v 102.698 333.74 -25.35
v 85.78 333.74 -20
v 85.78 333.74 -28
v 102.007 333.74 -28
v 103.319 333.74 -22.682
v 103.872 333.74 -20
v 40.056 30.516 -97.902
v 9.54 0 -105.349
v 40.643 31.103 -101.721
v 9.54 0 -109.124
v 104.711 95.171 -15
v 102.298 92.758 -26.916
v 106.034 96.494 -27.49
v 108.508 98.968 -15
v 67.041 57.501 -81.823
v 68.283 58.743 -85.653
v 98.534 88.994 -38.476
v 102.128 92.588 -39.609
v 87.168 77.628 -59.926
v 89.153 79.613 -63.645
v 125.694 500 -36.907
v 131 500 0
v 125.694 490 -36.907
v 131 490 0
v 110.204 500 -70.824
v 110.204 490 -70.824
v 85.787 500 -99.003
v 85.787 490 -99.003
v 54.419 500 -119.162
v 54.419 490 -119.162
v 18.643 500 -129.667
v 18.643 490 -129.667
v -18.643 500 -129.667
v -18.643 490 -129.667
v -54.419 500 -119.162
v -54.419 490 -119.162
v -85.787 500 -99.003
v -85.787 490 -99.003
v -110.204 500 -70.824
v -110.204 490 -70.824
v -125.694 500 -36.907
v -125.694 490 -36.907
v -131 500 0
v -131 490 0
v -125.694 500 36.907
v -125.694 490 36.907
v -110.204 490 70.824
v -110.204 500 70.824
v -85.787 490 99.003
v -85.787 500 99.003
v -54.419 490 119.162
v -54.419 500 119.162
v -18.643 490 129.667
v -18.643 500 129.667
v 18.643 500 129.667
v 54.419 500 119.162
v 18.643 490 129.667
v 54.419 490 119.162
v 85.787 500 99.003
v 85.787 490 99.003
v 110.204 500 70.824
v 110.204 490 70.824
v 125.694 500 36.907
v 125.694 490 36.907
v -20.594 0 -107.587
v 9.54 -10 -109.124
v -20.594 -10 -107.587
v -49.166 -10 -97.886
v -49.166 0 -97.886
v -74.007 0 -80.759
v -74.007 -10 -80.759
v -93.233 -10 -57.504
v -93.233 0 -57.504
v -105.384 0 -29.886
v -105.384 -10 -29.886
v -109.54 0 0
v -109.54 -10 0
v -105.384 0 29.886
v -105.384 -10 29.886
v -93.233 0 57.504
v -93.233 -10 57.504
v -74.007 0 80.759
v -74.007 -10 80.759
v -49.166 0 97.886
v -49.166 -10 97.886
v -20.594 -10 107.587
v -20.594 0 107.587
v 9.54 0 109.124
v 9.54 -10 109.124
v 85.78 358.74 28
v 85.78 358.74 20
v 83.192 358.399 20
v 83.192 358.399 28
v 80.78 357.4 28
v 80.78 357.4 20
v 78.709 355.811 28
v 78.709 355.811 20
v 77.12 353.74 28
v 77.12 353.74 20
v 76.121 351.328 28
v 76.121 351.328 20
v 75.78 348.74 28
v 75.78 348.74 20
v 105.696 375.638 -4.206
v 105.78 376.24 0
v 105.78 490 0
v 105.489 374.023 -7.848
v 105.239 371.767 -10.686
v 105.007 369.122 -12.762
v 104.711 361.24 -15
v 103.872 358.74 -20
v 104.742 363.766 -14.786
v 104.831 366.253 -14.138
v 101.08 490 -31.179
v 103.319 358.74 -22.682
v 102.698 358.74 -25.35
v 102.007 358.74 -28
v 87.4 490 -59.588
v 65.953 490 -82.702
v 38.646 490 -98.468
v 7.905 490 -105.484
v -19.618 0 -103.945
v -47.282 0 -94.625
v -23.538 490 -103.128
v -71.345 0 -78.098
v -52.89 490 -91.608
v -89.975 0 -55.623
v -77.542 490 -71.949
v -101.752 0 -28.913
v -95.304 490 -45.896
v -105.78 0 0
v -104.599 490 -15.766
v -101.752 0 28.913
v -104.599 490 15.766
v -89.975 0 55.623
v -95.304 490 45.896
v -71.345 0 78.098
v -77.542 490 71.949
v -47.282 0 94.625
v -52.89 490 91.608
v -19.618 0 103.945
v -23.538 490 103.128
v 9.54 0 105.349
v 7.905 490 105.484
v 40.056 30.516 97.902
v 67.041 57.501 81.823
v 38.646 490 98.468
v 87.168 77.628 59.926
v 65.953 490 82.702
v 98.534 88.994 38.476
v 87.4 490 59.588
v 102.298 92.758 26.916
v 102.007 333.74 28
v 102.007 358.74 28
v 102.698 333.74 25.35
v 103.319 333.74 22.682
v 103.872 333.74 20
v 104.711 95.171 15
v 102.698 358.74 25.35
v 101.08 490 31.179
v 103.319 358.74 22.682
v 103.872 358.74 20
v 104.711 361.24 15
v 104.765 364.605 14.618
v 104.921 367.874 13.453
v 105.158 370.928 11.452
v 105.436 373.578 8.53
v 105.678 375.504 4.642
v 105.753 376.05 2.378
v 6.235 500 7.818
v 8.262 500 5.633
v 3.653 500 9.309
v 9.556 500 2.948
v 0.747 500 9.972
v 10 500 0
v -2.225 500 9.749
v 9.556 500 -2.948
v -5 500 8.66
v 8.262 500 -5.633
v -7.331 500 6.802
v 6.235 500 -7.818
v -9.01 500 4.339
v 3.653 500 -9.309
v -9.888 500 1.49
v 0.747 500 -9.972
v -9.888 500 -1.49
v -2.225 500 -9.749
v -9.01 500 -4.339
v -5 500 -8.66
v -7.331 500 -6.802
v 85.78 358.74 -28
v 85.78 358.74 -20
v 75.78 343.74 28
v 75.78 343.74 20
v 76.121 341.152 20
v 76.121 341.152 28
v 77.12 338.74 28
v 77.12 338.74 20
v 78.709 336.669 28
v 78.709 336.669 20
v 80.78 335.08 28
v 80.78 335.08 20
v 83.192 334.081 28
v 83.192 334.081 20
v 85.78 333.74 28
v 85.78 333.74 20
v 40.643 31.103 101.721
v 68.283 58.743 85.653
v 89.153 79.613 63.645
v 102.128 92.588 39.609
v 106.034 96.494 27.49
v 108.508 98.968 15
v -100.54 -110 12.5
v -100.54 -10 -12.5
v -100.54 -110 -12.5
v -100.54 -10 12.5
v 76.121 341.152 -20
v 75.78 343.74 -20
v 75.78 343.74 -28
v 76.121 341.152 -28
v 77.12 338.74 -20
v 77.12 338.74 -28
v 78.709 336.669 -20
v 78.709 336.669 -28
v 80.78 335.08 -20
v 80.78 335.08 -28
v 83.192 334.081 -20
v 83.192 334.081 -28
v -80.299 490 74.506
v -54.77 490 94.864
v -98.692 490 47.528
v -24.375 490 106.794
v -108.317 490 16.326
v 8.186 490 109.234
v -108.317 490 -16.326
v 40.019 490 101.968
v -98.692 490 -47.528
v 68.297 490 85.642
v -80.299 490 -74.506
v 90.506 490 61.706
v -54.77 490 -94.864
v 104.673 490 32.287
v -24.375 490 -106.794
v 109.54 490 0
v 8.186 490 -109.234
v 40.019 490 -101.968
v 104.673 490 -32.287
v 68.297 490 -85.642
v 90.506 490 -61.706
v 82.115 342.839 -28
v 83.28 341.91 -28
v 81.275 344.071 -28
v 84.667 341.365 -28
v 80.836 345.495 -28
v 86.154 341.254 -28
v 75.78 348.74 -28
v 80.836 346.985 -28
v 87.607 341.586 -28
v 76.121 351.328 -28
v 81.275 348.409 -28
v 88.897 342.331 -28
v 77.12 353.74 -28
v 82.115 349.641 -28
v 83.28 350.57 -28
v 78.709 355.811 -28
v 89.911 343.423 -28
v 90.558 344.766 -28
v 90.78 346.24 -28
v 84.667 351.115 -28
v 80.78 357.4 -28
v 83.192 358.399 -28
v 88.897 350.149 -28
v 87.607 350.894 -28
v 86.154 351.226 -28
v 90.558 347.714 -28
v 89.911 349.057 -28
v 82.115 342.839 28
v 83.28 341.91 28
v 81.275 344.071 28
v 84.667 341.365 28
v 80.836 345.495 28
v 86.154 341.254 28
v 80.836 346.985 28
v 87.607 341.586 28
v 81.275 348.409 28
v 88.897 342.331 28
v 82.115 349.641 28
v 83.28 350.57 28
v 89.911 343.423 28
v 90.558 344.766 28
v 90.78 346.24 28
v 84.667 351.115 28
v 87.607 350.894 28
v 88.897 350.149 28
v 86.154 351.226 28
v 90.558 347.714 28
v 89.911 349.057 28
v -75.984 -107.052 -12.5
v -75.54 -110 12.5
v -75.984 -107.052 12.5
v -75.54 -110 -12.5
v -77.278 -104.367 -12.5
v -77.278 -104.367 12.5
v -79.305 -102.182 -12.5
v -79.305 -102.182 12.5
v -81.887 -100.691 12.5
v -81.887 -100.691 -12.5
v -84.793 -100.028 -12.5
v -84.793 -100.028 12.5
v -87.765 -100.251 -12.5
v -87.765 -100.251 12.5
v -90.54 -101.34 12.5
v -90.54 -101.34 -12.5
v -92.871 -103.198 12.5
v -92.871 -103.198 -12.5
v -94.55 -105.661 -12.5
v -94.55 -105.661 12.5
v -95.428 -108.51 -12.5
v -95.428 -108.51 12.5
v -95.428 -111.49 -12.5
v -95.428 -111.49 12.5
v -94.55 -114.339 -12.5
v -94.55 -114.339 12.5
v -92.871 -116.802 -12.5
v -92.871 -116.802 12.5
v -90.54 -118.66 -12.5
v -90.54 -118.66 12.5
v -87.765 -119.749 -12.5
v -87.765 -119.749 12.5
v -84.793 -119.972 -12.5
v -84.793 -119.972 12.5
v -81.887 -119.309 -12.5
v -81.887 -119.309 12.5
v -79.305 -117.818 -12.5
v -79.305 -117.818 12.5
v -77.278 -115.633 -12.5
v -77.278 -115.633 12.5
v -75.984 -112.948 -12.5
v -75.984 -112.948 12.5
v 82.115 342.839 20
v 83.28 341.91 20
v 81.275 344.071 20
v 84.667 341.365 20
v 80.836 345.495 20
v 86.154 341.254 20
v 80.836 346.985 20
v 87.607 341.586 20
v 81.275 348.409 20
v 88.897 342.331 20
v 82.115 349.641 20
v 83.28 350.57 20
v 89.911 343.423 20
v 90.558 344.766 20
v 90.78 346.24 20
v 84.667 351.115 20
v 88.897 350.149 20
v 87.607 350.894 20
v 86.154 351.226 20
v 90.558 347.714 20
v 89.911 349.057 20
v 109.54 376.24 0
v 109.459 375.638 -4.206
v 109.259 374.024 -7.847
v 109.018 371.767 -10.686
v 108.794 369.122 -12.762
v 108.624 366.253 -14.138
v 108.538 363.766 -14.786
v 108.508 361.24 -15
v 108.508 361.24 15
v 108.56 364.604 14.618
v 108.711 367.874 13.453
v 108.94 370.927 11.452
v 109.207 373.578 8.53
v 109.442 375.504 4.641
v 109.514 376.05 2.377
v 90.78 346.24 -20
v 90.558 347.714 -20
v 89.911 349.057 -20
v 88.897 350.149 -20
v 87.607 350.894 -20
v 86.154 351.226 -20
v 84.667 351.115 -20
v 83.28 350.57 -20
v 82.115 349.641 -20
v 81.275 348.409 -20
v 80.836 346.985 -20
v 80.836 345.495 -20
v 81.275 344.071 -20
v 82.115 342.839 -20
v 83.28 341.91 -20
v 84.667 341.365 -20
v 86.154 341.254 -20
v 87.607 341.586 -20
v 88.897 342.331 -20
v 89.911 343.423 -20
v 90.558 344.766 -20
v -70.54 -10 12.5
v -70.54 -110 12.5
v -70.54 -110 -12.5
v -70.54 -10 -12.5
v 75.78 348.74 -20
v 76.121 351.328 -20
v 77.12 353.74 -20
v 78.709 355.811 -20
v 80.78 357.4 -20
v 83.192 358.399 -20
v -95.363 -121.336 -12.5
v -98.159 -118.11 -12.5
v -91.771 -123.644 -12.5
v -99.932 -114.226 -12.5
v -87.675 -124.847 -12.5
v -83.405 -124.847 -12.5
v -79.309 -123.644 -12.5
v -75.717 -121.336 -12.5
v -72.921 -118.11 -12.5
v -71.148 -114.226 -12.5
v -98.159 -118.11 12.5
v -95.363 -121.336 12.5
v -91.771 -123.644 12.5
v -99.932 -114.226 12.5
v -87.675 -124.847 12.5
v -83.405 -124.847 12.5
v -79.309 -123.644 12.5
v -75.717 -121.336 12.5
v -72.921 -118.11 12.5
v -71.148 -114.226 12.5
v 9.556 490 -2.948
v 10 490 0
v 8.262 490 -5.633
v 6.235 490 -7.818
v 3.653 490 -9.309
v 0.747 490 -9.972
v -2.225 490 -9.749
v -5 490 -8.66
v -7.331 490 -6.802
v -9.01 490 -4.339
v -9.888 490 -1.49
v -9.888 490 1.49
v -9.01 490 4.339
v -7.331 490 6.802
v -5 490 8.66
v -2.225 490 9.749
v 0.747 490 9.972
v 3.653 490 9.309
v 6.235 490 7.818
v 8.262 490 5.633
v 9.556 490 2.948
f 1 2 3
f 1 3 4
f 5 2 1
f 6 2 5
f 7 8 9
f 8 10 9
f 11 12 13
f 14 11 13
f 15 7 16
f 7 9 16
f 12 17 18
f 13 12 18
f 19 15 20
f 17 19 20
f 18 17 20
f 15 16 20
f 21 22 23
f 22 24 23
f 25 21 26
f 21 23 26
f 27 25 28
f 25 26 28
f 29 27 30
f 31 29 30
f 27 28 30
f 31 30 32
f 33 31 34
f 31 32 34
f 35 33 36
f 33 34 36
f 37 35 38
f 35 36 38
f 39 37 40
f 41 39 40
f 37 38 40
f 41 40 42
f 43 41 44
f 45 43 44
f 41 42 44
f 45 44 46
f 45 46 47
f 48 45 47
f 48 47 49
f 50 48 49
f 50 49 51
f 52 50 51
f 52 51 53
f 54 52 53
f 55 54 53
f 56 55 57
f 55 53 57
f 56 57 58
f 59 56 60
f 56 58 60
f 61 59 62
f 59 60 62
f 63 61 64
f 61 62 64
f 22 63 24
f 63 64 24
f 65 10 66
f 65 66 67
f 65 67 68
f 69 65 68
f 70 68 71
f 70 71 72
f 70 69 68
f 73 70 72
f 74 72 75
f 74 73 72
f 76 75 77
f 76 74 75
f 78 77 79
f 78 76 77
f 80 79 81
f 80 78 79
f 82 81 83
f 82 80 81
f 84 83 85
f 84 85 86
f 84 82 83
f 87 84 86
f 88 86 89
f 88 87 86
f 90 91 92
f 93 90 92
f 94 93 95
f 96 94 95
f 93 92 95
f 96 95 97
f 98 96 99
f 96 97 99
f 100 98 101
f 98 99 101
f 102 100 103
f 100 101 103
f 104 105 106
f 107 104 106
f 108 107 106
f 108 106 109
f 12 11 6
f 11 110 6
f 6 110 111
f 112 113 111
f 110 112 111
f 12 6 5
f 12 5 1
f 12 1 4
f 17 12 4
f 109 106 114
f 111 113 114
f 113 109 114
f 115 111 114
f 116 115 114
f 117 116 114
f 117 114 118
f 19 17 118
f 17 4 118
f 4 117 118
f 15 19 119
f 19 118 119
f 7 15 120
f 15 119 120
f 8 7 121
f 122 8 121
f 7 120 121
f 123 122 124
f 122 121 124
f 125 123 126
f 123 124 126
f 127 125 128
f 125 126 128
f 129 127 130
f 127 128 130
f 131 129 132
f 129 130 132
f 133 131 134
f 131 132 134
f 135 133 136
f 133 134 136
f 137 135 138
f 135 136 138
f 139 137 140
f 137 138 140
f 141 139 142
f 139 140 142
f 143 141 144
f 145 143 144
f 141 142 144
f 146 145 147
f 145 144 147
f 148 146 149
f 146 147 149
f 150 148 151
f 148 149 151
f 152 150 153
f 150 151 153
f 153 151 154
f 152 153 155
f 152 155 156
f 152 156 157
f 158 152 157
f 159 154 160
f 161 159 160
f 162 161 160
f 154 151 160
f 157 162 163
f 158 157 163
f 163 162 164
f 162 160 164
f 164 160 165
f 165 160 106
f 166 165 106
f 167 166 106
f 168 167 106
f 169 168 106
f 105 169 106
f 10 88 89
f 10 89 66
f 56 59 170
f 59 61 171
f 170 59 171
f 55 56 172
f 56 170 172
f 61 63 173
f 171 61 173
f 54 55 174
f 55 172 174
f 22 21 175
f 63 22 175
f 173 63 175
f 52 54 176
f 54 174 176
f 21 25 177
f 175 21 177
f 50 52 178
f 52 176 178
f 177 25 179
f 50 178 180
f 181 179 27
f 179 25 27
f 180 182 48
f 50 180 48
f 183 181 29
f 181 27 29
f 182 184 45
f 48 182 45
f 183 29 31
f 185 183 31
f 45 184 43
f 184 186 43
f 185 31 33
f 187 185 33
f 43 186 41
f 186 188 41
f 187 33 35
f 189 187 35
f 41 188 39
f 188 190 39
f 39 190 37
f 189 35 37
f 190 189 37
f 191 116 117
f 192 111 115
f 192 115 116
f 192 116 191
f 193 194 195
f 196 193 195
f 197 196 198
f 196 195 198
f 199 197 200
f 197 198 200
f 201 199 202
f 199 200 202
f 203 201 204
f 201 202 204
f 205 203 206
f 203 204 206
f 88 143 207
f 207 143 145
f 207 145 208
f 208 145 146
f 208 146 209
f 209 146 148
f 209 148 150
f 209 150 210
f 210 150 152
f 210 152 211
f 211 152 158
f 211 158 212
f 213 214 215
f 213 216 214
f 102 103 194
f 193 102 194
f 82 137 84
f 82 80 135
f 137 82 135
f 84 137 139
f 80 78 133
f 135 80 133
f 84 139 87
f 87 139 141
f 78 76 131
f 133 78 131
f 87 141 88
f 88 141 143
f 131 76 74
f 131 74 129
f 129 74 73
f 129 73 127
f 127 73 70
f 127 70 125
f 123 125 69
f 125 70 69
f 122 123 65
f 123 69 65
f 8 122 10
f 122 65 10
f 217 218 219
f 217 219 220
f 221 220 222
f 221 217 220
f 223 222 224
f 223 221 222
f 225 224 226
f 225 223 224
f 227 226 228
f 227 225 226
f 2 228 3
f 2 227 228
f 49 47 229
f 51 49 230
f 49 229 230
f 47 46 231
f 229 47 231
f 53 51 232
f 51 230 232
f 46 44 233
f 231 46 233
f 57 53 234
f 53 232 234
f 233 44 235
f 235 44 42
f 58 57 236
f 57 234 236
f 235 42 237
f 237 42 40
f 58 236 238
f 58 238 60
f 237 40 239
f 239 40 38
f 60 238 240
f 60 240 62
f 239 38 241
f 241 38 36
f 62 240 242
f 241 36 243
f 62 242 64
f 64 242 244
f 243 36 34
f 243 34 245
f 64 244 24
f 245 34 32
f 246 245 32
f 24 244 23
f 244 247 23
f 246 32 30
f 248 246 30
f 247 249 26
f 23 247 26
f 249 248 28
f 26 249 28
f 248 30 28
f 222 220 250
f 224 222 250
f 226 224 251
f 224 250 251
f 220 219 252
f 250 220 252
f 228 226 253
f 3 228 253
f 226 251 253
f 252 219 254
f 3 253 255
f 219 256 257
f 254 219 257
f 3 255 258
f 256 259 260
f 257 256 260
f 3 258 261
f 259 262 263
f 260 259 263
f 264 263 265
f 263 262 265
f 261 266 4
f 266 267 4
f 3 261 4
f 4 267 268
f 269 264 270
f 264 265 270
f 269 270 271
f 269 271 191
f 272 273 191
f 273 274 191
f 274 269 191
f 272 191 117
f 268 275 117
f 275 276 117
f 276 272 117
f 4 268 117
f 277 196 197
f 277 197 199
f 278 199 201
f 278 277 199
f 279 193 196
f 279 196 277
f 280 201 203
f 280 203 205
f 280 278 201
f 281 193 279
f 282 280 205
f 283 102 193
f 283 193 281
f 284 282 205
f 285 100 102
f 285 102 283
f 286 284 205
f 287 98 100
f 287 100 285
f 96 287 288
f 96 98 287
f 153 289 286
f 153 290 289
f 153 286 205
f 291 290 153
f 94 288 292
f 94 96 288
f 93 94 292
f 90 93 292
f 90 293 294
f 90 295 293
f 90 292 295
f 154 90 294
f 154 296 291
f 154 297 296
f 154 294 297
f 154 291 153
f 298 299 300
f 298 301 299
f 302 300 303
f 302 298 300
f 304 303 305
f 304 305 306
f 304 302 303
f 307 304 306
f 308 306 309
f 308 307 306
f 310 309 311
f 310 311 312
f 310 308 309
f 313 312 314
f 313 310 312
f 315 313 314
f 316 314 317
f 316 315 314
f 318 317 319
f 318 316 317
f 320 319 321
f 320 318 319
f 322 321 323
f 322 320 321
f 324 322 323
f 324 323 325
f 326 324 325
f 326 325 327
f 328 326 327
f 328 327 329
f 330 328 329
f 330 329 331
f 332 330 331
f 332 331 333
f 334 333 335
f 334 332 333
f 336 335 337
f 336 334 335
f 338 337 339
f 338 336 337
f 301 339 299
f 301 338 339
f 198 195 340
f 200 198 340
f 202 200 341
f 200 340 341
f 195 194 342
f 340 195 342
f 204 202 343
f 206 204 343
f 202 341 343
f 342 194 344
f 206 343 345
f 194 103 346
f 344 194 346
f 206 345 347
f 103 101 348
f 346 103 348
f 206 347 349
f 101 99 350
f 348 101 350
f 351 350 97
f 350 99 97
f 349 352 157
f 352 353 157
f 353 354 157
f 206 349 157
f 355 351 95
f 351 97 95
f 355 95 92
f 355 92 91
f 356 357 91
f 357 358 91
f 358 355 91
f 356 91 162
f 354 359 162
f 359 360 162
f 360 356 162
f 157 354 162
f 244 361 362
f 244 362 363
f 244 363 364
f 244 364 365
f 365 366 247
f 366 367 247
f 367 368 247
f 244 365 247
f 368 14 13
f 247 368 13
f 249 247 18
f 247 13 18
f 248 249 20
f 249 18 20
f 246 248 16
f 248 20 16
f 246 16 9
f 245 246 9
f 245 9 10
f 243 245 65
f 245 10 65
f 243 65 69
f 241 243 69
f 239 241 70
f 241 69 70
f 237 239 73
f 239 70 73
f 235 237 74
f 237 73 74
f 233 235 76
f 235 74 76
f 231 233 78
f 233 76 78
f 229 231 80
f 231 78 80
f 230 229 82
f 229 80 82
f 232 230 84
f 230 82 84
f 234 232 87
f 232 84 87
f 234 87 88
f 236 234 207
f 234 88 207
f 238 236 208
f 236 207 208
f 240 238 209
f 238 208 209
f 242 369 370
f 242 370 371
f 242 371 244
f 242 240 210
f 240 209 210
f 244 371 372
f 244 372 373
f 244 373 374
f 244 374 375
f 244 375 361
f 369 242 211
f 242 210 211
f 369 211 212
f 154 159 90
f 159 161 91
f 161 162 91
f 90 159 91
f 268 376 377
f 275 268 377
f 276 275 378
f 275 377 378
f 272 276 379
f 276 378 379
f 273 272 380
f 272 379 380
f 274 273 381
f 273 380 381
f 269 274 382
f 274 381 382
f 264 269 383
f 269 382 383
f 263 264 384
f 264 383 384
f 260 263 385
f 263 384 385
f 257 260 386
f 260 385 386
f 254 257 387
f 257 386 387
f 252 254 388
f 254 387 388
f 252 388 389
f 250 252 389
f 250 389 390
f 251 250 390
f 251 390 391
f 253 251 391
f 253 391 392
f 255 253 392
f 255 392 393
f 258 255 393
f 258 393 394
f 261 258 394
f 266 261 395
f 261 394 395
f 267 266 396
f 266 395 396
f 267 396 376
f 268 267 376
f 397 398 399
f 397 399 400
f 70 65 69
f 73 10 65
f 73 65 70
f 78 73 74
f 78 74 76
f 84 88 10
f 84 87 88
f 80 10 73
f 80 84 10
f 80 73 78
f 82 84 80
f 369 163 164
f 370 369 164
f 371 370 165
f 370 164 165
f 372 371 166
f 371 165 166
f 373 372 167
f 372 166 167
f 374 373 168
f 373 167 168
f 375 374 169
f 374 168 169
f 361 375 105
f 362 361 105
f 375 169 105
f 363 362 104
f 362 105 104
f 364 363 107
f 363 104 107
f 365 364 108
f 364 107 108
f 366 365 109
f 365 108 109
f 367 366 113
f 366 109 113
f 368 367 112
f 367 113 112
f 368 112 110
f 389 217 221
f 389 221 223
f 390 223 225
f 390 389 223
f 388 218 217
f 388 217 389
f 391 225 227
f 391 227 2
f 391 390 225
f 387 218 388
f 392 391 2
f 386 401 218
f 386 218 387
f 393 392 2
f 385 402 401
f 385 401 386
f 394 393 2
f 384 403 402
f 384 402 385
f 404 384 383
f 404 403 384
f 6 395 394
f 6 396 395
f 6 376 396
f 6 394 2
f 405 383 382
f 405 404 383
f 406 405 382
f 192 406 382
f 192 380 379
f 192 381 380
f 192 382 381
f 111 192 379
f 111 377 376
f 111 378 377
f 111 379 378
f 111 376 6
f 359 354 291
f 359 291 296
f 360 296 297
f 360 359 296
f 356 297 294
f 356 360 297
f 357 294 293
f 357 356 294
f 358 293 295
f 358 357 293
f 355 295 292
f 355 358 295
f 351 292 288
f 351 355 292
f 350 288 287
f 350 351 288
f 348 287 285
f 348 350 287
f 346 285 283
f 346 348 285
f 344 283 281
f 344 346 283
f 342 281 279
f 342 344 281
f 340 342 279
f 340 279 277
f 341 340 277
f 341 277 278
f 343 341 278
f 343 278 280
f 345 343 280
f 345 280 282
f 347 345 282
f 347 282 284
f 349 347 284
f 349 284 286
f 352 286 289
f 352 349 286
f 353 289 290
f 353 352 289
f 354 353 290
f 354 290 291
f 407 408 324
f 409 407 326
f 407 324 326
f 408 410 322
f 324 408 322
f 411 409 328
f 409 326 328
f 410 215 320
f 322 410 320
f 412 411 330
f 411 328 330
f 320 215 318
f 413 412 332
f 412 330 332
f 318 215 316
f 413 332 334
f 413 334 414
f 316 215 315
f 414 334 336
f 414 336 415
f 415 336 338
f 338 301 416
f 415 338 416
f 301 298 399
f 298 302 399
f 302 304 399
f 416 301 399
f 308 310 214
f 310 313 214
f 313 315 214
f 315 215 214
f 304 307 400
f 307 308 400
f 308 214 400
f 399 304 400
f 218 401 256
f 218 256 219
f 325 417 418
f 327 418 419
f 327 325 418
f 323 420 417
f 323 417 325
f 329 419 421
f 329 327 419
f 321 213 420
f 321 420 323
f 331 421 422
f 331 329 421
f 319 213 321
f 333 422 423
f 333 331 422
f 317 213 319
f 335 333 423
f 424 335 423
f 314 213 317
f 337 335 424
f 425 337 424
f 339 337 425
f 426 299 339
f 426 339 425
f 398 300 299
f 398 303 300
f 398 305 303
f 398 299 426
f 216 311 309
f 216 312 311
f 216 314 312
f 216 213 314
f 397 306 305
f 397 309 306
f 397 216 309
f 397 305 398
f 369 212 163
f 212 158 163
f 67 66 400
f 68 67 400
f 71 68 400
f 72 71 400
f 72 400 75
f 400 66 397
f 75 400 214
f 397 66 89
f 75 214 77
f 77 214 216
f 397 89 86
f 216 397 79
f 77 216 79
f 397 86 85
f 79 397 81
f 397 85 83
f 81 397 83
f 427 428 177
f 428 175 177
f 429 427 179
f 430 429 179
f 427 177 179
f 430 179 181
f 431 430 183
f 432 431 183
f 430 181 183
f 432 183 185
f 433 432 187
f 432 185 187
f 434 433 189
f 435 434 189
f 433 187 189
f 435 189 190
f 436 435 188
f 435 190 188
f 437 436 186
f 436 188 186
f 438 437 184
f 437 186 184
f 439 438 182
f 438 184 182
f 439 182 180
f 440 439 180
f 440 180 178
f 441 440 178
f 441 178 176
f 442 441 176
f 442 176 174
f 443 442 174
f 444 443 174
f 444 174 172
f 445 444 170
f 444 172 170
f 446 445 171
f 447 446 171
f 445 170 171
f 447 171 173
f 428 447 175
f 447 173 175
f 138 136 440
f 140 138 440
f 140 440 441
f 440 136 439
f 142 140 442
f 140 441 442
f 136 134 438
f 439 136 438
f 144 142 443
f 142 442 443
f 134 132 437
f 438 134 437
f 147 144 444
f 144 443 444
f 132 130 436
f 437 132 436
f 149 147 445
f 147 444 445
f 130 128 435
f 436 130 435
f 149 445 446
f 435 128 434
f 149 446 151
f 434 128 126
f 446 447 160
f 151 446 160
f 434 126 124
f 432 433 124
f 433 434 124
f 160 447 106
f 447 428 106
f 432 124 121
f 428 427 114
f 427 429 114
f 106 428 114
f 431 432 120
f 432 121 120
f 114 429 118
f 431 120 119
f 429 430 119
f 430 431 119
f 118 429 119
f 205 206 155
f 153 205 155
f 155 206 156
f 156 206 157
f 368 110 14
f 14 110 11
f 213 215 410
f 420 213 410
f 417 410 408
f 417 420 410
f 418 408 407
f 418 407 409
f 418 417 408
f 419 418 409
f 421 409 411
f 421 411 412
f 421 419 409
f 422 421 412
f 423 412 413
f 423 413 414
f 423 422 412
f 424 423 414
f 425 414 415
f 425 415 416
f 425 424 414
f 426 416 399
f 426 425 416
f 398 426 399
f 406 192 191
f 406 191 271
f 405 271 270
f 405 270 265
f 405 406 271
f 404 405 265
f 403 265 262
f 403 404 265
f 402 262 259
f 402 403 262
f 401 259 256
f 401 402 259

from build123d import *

# Parameters (mm, degrees)
CORTE_EXTRUS_O1_DEPTH      = 132
CORTE_EXTRUS_O1_DEPTH_BACK = 132
RESSALTO_EXTRUS_O1_DEPTH   = 10
ESBO_O4_R                  = 10
RESSALTO_EXTRUS_O2_DEPTH   = 12.5
RESSALTO_EXTRUS_O3_START   = 20
ESBO_O5_R                  = 5
RESSALTO_EXTRUS_O3_DEPTH   = 8
CORTE_EXTRUS_O2_DEPTH      = 132


with BuildPart() as part:
    # Esboço1 → Revolução1 (revolve)
    with BuildSketch(Plane.XY):
        Polygon((10, 500), (131, 500), (131, 490), (109.54, 490), (109.54, 0), (105.78, 0), (105.78, 490), (10, 490), align=None)
    revolve(axis=Axis((0, 0, 0), (0, 1, 0)))

    # Esboço2 → Corte-extrusão1 (cut, two sides)
    with BuildSketch(Plane.XY) as corte_extrus_o1_sk:
        Polygon((9.54, 0), (109.54, 100), (109.54, 0), align=None)
    extrude(amount=CORTE_EXTRUS_O1_DEPTH, mode=Mode.SUBTRACT)
    extrude(corte_extrus_o1_sk.sketch, amount=-CORTE_EXTRUS_O1_DEPTH_BACK, mode=Mode.SUBTRACT)

    # Esboço5 → Ressalto-extrusão3 (add)
    with BuildSketch(Plane.XY.offset(RESSALTO_EXTRUS_O3_START)):
        with BuildLine():
            Line((105.78, 358.74), (85.78, 358.74))
            ThreePointArc((85.78, 358.74), (78.708932188, 355.811067812), (75.78, 348.74))
            Line((75.78, 348.74), (75.78, 343.74))
            ThreePointArc((75.78, 343.74), (78.708932188, 336.668932188), (85.78, 333.74))
            Line((85.78, 333.74), (105.78, 333.74))
            Line((105.78, 333.74), (105.78, 358.74))
        make_face()
        with Locations((85.78, 346.24)):
            Circle(ESBO_O5_R, mode=Mode.SUBTRACT)
    ressalto_extrus_o3 = extrude(amount=RESSALTO_EXTRUS_O3_DEPTH)

    # Espelhar1: Ressalto-extrusão3 across plane
    add(ressalto_extrus_o3.mirror(Plane.XY))

    # Esboço6 → Corte-extrusão2 (cut, through all)
    with BuildSketch(Plane(origin=(0, 0, 0), x_dir=(0, 0, -1), z_dir=(1, 0, 0))):
        with BuildLine():
            Line((15, 361.24), (15, 15))
            ThreePointArc((15, 15), (0, 0), (-15, 15))
            Line((-15, 15), (-15, 361.24))
            ThreePointArc((-15, 361.24), (0, 376.24), (15, 361.24))
        make_face()
    extrude(amount=CORTE_EXTRUS_O2_DEPTH, mode=Mode.SUBTRACT)


with BuildPart() as body_2:
    # Esboço3 → Ressalto-extrusão1 (new body)
    with BuildSketch(Plane.XZ):
        with BuildLine():
            Line((9.54, 109.123782926), (9.54, -109.123782926))
            ThreePointArc((9.54, -109.123782926), (-109.54, 0), (9.54, 109.123782926))
        make_face()
    extrude(amount=RESSALTO_EXTRUS_O1_DEPTH)

    # Esboço4 → Ressalto-extrusão2 (add, symmetric)
    with BuildSketch(Plane.XY):
        with BuildLine():
            Line((-100.54, -10), (-100.54, -110))
            ThreePointArc((-100.54, -110), (-85.54, -125), (-70.54, -110))
            Line((-70.54, -110), (-70.54, -10))
            Line((-70.54, -10), (-100.54, -10))
        make_face()
        with Locations((-85.54, -110)):
            Circle(ESBO_O4_R, mode=Mode.SUBTRACT)
    extrude(amount=RESSALTO_EXTRUS_O2_DEPTH, both=True)


solid = Compound([part.part, body_2.part])
